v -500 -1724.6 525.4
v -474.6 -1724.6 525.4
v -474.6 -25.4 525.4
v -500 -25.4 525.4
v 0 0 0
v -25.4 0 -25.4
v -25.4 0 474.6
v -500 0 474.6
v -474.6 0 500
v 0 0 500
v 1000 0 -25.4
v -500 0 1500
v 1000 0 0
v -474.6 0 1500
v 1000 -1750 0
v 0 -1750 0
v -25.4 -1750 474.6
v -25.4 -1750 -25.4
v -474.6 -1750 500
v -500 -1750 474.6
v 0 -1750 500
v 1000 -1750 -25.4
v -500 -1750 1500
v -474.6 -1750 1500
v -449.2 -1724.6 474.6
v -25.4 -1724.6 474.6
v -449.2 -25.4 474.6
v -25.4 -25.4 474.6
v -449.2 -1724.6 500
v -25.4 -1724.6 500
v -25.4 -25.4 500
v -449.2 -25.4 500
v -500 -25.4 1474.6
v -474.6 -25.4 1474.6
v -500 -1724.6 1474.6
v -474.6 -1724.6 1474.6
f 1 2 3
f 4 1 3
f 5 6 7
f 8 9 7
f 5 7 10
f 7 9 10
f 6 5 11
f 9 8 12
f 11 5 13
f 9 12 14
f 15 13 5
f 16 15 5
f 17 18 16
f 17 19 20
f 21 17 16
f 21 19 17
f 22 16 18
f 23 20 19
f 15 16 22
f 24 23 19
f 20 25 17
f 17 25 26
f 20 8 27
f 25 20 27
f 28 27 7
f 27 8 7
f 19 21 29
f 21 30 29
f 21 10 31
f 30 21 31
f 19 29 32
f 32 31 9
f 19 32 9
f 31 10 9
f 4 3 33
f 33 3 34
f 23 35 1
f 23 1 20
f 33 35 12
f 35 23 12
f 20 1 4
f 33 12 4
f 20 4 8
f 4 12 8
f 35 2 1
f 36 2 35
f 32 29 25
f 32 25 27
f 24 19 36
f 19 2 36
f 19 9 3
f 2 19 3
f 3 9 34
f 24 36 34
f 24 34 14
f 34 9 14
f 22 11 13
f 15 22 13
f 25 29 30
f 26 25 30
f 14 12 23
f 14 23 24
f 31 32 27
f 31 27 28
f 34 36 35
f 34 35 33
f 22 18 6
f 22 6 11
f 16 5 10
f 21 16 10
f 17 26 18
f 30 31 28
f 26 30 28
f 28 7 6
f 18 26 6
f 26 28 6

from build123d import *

# Parameters (mm, degrees)
F0_W     = 25.4
F0_H     = 25.4
F0_H_2   = 1000
F1_DEPTH = 1750
F2_W     = 423.8
F2_H     = 1699.2
F3_DEPTH = 25.4
F4_W     = 1699.2
F4_H     = 949.2
F5_DEPTH = 25.4


with BuildPart() as f1:
    # F0 (on Front) → F1 (new body)
    with BuildSketch(Plane.XZ):
        Polygon((1000, 0), (0, 0), (0, 500), (-474.6, 500), (-474.6, 474.6), (-25.4, 474.6), (-25.4, -25.4), (1000, -25.4), align=None)
        with Locations((-487.3, 487.3)):
            Rectangle(F0_W, F0_H)
        with Locations((-487.3, 1000)):
            Rectangle(F0_W, F0_H_2)
    extrude(amount=F1_DEPTH)

    # F2 (on face) → F3 (cut)
    with BuildSketch(Plane.XY.offset(500)):
        with Locations((-237.3, -875)):
            Rectangle(F2_W, F2_H)
    extrude(amount=-F3_DEPTH, mode=Mode.SUBTRACT)

    # F4 (on face) → F5 (cut)
    with BuildSketch(Plane.YZ.offset(-474.6)):
        with Locations((-875, 1000)):
            Rectangle(F4_W, F4_H)
    extrude(amount=-F5_DEPTH, mode=Mode.SUBTRACT)


solid = f1.part
